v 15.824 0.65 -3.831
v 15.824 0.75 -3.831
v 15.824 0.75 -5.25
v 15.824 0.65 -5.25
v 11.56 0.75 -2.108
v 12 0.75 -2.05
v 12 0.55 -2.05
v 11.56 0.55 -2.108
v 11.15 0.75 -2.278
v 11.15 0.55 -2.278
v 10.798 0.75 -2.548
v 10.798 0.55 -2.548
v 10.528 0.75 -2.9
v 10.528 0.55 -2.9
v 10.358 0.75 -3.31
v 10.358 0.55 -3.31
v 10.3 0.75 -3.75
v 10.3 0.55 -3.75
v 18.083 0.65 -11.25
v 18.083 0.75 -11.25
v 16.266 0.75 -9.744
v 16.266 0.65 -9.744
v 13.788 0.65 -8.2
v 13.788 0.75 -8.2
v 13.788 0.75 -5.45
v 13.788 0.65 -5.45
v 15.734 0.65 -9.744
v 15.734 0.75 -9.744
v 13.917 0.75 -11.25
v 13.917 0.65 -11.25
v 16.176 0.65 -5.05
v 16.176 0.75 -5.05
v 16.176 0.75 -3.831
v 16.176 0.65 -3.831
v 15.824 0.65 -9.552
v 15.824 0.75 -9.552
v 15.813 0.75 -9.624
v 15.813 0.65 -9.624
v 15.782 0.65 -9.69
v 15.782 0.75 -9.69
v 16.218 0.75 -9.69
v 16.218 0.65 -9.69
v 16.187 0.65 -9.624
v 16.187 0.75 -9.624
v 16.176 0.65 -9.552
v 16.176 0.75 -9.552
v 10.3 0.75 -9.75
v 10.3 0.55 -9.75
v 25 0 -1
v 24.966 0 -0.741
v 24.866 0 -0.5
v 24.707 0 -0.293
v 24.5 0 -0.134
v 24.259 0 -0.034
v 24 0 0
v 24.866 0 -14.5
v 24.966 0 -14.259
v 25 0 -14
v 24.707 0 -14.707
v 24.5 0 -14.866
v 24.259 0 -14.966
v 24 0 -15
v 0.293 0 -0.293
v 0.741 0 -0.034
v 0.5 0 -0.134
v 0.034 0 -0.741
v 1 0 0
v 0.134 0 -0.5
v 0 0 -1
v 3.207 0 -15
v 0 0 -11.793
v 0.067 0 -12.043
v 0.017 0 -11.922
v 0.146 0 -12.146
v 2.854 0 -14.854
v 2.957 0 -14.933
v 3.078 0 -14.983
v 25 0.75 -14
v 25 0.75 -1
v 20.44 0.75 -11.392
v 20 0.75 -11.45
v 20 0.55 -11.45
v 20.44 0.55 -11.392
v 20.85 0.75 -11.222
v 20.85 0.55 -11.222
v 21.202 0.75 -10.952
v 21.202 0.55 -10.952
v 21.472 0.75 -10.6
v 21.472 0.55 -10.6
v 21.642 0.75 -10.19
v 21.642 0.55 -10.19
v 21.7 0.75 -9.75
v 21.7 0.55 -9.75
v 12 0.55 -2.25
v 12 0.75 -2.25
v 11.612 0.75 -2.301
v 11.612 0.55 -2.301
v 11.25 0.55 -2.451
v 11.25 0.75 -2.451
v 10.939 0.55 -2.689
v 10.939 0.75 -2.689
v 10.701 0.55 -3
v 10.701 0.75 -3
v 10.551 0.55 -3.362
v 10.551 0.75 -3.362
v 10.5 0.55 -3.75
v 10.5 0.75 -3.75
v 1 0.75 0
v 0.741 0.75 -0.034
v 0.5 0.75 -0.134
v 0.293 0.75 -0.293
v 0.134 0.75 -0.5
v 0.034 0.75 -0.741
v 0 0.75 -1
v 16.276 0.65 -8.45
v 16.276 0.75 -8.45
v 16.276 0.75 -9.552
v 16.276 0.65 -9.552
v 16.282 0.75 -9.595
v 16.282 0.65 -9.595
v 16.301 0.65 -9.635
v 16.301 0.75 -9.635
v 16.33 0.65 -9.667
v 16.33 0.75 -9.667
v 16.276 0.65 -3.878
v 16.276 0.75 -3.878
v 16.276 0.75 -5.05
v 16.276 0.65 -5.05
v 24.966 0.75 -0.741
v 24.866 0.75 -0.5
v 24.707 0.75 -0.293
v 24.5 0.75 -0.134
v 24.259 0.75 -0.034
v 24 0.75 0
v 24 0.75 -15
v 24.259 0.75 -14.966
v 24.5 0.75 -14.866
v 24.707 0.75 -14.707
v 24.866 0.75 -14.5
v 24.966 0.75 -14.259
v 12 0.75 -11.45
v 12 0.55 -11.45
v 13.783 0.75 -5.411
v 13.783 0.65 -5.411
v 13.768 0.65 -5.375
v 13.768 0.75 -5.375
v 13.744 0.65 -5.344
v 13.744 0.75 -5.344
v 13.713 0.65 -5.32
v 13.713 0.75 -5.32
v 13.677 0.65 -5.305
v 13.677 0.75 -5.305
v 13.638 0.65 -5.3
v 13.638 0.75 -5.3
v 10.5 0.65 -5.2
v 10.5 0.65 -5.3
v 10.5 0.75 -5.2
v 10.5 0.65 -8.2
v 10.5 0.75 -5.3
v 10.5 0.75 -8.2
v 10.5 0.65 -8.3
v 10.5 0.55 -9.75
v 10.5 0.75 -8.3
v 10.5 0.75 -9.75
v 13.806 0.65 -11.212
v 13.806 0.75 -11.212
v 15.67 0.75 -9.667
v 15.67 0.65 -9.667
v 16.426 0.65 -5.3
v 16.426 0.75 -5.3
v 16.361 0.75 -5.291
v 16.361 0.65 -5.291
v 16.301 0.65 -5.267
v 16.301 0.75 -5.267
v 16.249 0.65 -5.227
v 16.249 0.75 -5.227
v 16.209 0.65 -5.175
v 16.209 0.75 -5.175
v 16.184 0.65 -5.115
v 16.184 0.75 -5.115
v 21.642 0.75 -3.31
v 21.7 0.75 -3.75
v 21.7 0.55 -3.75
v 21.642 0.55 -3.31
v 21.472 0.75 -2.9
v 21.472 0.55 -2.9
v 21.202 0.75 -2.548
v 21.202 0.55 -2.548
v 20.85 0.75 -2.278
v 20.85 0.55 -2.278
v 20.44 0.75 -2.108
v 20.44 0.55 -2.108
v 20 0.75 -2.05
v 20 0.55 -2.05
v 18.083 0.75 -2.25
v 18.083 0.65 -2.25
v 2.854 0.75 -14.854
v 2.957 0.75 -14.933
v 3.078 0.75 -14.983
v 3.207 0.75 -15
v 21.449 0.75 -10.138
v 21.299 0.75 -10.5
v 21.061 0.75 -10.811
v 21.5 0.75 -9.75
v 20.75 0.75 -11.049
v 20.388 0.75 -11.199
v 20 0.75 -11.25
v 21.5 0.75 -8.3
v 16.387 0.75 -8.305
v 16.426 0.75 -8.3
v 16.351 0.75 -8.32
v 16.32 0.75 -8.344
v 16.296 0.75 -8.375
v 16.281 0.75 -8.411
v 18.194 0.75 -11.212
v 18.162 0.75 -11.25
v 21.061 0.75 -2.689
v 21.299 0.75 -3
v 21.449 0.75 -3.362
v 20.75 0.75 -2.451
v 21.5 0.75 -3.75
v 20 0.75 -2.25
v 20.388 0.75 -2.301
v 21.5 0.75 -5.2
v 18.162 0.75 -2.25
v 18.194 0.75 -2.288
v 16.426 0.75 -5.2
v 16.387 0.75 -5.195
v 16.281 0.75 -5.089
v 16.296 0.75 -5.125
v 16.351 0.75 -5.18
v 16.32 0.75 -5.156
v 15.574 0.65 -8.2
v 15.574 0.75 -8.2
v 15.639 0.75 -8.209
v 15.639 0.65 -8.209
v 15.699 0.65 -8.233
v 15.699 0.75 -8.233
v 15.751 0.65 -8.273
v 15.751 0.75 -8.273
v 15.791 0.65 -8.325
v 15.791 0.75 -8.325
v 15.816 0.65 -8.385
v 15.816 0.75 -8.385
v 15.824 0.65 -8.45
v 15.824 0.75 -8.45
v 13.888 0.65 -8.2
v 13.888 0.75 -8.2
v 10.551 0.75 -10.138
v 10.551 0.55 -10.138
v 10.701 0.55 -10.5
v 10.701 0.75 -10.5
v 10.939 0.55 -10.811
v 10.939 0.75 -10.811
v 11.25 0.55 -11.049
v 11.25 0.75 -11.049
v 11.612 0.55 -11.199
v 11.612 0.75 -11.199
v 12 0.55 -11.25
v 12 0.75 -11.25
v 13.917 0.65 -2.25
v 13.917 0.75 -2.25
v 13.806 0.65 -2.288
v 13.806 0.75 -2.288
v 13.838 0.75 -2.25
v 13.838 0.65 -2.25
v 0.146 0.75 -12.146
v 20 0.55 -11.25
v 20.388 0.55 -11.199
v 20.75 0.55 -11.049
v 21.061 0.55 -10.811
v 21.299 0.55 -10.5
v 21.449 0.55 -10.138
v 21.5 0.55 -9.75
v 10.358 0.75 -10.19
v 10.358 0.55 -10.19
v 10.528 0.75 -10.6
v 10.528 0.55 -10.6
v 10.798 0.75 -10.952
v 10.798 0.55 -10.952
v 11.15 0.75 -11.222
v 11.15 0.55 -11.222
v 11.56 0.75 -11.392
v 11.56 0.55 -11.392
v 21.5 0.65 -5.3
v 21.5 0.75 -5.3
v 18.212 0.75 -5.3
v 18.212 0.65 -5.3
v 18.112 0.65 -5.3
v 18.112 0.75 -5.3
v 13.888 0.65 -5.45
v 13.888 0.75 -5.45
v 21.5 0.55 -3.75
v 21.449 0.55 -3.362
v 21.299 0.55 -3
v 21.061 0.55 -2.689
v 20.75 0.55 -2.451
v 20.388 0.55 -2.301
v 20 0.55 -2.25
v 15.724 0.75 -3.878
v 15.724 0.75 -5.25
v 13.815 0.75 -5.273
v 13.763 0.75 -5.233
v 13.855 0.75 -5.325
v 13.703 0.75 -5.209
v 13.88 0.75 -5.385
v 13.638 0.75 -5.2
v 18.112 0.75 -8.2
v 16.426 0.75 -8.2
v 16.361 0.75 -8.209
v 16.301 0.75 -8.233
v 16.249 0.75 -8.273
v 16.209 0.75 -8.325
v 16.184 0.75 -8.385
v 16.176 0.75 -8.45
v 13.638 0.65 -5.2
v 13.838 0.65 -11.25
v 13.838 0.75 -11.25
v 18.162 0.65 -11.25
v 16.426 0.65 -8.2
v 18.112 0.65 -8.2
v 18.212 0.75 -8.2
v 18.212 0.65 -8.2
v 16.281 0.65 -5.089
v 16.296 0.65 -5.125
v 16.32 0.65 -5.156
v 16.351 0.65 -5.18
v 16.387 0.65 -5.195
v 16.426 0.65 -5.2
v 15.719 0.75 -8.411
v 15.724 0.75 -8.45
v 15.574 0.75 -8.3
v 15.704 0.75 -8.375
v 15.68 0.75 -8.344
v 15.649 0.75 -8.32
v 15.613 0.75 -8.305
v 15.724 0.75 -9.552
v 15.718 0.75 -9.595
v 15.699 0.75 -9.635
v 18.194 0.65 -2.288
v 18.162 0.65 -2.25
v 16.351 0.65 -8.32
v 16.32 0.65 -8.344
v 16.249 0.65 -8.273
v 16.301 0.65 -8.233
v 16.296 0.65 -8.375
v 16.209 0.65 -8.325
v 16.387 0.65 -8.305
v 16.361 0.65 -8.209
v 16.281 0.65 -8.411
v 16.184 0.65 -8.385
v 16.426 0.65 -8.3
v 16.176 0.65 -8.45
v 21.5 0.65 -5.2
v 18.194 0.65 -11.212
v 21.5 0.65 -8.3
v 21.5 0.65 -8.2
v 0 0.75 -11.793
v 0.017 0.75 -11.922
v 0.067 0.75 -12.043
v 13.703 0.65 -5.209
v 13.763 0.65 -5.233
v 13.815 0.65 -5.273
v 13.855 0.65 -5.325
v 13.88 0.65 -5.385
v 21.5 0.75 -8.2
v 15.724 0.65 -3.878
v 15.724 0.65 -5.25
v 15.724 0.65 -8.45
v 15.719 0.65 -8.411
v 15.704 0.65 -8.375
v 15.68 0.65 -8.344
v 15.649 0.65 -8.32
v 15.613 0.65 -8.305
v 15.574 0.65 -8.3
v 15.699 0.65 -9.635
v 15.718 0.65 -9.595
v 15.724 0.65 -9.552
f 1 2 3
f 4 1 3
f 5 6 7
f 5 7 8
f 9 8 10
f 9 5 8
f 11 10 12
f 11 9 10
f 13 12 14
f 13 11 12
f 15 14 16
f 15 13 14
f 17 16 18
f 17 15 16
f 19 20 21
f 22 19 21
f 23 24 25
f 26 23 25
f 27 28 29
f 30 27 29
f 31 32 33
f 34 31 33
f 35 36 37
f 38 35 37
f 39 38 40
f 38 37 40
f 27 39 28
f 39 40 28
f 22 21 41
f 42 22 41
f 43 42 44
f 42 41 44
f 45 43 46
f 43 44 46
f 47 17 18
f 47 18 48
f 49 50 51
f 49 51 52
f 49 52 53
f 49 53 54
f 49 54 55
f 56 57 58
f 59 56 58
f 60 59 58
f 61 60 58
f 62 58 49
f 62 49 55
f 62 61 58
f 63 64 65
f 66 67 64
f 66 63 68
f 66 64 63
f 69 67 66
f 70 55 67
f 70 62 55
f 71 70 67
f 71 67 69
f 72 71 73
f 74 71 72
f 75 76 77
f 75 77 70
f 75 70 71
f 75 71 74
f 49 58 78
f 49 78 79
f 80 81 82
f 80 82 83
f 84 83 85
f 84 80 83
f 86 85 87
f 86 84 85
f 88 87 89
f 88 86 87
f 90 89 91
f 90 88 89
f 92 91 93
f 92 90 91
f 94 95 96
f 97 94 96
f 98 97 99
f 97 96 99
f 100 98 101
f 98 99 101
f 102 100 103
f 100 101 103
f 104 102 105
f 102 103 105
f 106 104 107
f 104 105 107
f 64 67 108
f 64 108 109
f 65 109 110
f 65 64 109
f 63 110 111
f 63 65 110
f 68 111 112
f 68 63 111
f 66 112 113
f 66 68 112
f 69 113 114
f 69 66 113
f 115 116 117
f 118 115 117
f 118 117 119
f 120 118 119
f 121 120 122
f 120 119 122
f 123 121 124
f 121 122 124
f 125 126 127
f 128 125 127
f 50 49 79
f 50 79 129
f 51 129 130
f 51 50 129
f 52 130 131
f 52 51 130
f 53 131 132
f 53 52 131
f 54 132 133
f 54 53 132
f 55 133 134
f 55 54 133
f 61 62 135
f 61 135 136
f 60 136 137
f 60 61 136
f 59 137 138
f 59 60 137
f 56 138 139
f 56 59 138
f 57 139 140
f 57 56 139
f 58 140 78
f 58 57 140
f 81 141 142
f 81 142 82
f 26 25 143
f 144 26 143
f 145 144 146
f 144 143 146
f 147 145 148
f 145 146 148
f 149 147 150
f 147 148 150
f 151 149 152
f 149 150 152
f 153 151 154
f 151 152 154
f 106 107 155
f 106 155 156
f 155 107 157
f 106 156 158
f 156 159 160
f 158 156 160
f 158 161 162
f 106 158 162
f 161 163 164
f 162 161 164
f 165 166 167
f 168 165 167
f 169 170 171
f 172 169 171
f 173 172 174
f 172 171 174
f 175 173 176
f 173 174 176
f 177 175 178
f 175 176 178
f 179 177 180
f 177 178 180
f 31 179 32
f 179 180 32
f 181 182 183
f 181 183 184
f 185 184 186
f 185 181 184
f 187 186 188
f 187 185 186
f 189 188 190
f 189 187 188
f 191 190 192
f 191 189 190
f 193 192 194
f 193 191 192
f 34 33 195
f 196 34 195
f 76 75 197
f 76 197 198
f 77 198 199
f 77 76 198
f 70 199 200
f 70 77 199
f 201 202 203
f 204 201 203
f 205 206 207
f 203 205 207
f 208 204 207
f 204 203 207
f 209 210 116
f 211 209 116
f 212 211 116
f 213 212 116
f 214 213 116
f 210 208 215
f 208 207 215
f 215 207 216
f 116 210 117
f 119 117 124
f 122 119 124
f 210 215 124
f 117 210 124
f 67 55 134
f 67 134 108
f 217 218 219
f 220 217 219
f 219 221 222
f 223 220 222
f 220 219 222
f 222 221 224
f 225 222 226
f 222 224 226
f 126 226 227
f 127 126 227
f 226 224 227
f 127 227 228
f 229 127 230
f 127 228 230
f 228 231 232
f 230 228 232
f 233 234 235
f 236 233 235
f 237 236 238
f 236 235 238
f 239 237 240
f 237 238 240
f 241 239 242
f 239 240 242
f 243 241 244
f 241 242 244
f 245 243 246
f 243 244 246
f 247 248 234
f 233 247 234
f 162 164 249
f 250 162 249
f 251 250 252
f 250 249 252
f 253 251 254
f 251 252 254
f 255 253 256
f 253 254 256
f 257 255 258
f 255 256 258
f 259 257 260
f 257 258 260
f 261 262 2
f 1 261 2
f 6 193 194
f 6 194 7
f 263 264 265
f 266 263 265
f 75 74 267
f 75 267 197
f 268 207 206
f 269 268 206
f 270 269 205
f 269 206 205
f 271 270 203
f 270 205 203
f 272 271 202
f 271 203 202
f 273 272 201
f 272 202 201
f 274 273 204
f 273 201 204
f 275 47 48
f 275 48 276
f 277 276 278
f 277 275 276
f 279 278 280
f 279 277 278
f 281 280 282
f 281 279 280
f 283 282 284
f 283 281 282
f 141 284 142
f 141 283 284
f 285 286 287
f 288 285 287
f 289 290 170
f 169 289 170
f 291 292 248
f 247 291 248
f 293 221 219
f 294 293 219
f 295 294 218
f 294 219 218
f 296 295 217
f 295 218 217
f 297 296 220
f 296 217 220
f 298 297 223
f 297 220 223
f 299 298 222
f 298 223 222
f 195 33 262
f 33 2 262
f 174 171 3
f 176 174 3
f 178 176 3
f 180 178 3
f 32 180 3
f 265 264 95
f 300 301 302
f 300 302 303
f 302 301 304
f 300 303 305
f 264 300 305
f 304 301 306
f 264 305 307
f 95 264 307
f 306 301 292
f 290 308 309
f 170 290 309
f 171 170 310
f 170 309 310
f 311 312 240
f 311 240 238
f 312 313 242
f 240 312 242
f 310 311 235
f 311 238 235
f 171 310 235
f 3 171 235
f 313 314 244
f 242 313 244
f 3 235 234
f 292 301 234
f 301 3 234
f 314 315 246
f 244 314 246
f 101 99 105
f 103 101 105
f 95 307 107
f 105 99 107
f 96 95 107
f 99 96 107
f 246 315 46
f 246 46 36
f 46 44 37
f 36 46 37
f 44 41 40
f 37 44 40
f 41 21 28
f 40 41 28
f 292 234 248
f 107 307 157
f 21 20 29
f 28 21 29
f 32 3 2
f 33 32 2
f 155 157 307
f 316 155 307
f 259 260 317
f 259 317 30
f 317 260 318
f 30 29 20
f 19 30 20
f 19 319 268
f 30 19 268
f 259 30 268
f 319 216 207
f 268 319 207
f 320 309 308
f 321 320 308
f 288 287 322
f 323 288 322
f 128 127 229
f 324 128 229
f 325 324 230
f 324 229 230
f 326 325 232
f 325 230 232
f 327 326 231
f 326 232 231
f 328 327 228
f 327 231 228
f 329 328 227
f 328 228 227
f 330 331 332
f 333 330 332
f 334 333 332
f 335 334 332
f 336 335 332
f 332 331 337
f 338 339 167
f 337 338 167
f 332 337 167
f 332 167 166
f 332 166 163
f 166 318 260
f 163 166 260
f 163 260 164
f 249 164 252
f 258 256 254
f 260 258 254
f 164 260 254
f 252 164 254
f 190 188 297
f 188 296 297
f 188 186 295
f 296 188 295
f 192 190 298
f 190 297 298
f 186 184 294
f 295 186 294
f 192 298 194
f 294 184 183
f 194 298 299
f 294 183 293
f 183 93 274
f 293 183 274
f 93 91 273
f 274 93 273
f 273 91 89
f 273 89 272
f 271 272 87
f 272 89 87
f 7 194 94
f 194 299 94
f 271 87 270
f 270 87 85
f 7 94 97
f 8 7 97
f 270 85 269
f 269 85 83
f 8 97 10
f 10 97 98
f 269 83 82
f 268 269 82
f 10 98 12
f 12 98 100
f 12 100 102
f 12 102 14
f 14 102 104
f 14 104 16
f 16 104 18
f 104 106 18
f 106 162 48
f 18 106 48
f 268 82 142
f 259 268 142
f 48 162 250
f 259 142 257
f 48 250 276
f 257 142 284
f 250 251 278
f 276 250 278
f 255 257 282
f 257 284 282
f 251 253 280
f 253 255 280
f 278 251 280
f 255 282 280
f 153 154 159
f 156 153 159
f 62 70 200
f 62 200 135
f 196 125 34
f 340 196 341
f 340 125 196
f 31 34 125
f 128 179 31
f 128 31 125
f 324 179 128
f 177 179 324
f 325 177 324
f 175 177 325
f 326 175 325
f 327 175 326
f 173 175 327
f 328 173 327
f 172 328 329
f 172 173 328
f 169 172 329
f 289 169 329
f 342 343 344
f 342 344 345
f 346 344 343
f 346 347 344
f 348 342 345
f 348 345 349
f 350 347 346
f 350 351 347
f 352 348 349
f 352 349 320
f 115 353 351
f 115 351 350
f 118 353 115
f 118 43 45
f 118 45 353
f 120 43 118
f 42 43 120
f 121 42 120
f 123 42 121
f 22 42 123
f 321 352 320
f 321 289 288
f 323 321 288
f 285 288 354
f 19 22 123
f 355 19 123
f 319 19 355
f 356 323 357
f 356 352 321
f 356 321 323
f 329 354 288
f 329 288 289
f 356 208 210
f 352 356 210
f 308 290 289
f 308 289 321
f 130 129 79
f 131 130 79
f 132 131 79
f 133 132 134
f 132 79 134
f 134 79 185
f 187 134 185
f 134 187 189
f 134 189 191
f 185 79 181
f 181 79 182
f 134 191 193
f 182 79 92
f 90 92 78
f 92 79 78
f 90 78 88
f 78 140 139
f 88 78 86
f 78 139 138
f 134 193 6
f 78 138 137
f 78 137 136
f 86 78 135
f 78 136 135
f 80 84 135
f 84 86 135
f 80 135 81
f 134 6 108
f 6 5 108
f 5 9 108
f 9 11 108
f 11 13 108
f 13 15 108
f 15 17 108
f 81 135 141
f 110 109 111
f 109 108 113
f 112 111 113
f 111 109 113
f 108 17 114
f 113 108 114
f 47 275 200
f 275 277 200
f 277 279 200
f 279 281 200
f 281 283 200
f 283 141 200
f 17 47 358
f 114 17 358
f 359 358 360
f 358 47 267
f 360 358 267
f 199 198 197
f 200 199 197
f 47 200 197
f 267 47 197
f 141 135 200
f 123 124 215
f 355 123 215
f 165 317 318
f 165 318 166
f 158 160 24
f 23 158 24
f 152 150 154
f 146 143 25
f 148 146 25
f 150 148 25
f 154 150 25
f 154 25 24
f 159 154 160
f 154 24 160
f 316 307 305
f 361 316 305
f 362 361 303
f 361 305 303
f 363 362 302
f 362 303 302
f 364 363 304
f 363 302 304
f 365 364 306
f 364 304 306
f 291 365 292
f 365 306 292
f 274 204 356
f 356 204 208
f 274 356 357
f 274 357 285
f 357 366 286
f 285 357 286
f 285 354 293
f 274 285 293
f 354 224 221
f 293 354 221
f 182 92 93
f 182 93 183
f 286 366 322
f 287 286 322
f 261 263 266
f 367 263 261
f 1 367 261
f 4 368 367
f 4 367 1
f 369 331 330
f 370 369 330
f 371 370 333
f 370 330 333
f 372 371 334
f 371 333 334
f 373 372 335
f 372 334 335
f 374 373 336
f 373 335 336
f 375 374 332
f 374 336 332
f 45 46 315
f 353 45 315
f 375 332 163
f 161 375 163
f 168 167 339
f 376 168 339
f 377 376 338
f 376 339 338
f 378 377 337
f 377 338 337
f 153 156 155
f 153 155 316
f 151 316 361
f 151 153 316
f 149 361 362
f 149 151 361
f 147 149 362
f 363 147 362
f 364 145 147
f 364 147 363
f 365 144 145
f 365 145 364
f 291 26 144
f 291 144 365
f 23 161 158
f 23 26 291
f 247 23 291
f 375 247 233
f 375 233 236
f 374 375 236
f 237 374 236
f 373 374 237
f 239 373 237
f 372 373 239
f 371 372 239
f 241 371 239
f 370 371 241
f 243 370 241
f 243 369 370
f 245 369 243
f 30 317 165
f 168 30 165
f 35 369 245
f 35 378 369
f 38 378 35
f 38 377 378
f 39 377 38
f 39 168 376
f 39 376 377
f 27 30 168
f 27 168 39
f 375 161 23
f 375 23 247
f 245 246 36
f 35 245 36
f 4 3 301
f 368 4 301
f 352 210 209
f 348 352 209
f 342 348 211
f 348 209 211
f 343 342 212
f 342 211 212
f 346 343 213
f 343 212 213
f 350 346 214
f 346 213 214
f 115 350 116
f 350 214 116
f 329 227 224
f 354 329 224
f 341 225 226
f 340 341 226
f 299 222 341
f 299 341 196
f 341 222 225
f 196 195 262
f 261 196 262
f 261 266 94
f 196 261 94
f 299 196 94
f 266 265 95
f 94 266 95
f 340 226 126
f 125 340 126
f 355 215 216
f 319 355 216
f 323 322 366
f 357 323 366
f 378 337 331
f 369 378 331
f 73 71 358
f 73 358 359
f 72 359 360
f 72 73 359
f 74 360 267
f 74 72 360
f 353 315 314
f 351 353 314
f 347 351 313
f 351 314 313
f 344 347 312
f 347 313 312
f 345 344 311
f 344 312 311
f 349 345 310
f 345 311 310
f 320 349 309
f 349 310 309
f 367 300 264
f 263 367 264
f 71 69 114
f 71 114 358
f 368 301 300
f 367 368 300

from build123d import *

# Parameters (mm, degrees)
EXTRUDE1_DEPTH          = 0.75
CUT_EXTRUDE_THIN1_DEPTH = 0.2
SKETCH3_W               = 0.1
SKETCH3_H               = 3
CUT_EXTRUDE_THIN6_DEPTH = 0.1


with BuildPart() as part:
    # Sketch1 → Extrude1 (new body)
    with BuildSketch(Plane(origin=(0, 0, 0), x_dir=(1, 0, 0), z_dir=(0, 1, 0))):
        with BuildLine():
            Line((0.146446609, 12.146446609), (2.853553391, 14.853553391))
            ThreePointArc((2.853553391, 14.853553391), (3.015765065, 14.961939766), (3.207106781, 15))
            Line((3.207106781, 15), (24, 15))
            ThreePointArc((24, 15), (24.707106781, 14.707106781), (25, 14))
            Line((25, 14), (25, 1))
            ThreePointArc((25, 1), (24.707106781, 0.292893219), (24, 0))
            Line((24, 0), (1, 0))
            ThreePointArc((1, 0), (0.292893219, 0.292893219), (0, 1))
            Line((0, 1), (0, 11.792893219))
            ThreePointArc((0, 11.792893219), (0.038060234, 11.984234935), (0.146446609, 12.146446609))
        make_face()
    extrude(amount=EXTRUDE1_DEPTH)

    # Sketch2 → Cut-Extrude-Thin1 (cut)
    with BuildSketch(Plane(origin=(0, 0.75, 0), x_dir=(1, 0, 0), z_dir=(0, 1, 0))):
        with BuildLine():
            Line((12, 11.45), (20, 11.45))
            ThreePointArc((20, 11.45), (21.202081528, 10.952081528), (21.7, 9.75))
            Line((21.7, 9.75), (21.7, 3.75))
            ThreePointArc((21.7, 3.75), (21.202081528, 2.547918472), (20, 2.05))
            Line((20, 2.05), (12, 2.05))
            ThreePointArc((12, 2.05), (10.797918472, 2.547918472), (10.3, 3.75))
            Line((10.3, 3.75), (10.3, 9.75))
            ThreePointArc((10.3, 9.75), (10.797918472, 10.952081528), (12, 11.45))
        make_face()
        with BuildLine():
            Line((12, 11.25), (20, 11.25))
            ThreePointArc((20, 11.25), (21.060660172, 10.810660172), (21.5, 9.75))
            Line((21.5, 9.75), (21.5, 3.75))
            ThreePointArc((21.5, 3.75), (21.060660172, 2.689339828), (20, 2.25))
            Line((20, 2.25), (12, 2.25))
            ThreePointArc((12, 2.25), (10.939339828, 2.689339828), (10.5, 3.75))
            Line((10.5, 3.75), (10.5, 9.75))
            ThreePointArc((10.5, 9.75), (10.939339828, 10.810660172), (12, 11.25))
        make_face(mode=Mode.SUBTRACT)
    extrude(amount=-CUT_EXTRUDE_THIN1_DEPTH, mode=Mode.SUBTRACT)

    # Sketch3 → Cut-Extrude-Thin6 (cut)
    with BuildSketch(Plane(origin=(0, 0.75, 0), x_dir=(1, 0, 0), z_dir=(0, 1, 0))):
        with BuildLine():
            Line((10.5, 8.2), (15.574041177, 8.2))
            ThreePointArc((15.574041177, 8.2), (15.750817872, 8.273223305), (15.824041177, 8.45))
            Line((15.824041177, 8.45), (15.824041177, 9.551936806))
            ThreePointArc((15.824041177, 9.551936806), (15.800290975, 9.658290126), (15.733552947, 9.744436144))
            Line((15.733552947, 9.744436144), (13.870171679, 11.288499868))
            Line((13.870171679, 11.288499868), (13.806366971, 11.211500132))
            Line((13.806366971, 11.211500132), (15.669748239, 9.667436409))
            ThreePointArc((15.669748239, 9.667436409), (15.709791056, 9.615748798), (15.724041177, 9.551936806))
            Line((15.724041177, 9.551936806), (15.724041177, 8.45))
            ThreePointArc((15.724041177, 8.45), (15.680107194, 8.343933983), (15.574041177, 8.3))
            Line((15.574041177, 8.3), (10.5, 8.3))
            Line((10.5, 8.3), (10.5, 8.2))
        make_face()
        with BuildLine():
            Line((21.5, 8.3), (16.425958823, 8.3))
            ThreePointArc((16.425958823, 8.3), (16.319892806, 8.343933983), (16.275958823, 8.45))
            Line((16.275958823, 8.45), (16.275958823, 9.551936806))
            ThreePointArc((16.275958823, 9.551936806), (16.290208944, 9.615748798), (16.330251761, 9.667436409))
            Line((16.330251761, 9.667436409), (18.193633029, 11.211500132))
            Line((18.193633029, 11.211500132), (18.129828321, 11.288499868))
            Line((18.129828321, 11.288499868), (16.266447053, 9.744436144))
            ThreePointArc((16.266447053, 9.744436144), (16.199709025, 9.658290126), (16.175958823, 9.551936806))
            Line((16.175958823, 9.551936806), (16.175958823, 8.45))
            ThreePointArc((16.175958823, 8.45), (16.249182128, 8.273223305), (16.425958823, 8.2))
            Line((16.425958823, 8.2), (21.5, 8.2))
            Line((21.5, 8.2), (21.5, 8.3))
        make_face()
        with BuildLine():
            Line((21.5, 5.3), (16.425958823, 5.3))
            ThreePointArc((16.425958823, 5.3), (16.249182128, 5.226776695), (16.175958823, 5.05))
            Line((16.175958823, 5.05), (16.175958823, 3.830545608))
            Line((16.175958823, 3.830545608), (18.129828321, 2.211500132))
            Line((18.129828321, 2.211500132), (18.193633029, 2.288499868))
            Line((18.193633029, 2.288499868), (16.275958823, 3.877552643))
            Line((16.275958823, 3.877552643), (16.275958823, 5.05))
            ThreePointArc((16.275958823, 5.05), (16.319892806, 5.156066017), (16.425958823, 5.2))
            Line((16.425958823, 5.2), (21.5, 5.2))
            Line((21.5, 5.2), (21.5, 5.3))
        make_face()
        Polygon((15.724041177, 5.25), (15.724041177, 3.877552643), (13.806366971, 2.288499868), (13.870171679, 2.211500132), (15.824041177, 3.830545608), (15.824041177, 5.25), align=None)
        with BuildLine():
            Line((10.5, 5.2), (13.638269325, 5.2))
            ThreePointArc((13.638269325, 5.2), (13.815046021, 5.273223305), (13.888269325, 5.45))
            Line((13.888269325, 5.45), (13.888269325, 8.25))
            Line((13.888269325, 8.25), (13.788269325, 8.25))
            Line((13.788269325, 8.25), (13.788269325, 5.45))
            ThreePointArc((13.788269325, 5.45), (13.744335343, 5.343933983), (13.638269325, 5.3))
            Line((13.638269325, 5.3), (10.5, 5.3))
            Line((10.5, 5.3), (10.5, 5.2))
        make_face()
        with Locations((18.161730675, 6.75)):
            Rectangle(SKETCH3_W, SKETCH3_H)
    extrude(amount=-CUT_EXTRUDE_THIN6_DEPTH, mode=Mode.SUBTRACT)


solid = part.part
